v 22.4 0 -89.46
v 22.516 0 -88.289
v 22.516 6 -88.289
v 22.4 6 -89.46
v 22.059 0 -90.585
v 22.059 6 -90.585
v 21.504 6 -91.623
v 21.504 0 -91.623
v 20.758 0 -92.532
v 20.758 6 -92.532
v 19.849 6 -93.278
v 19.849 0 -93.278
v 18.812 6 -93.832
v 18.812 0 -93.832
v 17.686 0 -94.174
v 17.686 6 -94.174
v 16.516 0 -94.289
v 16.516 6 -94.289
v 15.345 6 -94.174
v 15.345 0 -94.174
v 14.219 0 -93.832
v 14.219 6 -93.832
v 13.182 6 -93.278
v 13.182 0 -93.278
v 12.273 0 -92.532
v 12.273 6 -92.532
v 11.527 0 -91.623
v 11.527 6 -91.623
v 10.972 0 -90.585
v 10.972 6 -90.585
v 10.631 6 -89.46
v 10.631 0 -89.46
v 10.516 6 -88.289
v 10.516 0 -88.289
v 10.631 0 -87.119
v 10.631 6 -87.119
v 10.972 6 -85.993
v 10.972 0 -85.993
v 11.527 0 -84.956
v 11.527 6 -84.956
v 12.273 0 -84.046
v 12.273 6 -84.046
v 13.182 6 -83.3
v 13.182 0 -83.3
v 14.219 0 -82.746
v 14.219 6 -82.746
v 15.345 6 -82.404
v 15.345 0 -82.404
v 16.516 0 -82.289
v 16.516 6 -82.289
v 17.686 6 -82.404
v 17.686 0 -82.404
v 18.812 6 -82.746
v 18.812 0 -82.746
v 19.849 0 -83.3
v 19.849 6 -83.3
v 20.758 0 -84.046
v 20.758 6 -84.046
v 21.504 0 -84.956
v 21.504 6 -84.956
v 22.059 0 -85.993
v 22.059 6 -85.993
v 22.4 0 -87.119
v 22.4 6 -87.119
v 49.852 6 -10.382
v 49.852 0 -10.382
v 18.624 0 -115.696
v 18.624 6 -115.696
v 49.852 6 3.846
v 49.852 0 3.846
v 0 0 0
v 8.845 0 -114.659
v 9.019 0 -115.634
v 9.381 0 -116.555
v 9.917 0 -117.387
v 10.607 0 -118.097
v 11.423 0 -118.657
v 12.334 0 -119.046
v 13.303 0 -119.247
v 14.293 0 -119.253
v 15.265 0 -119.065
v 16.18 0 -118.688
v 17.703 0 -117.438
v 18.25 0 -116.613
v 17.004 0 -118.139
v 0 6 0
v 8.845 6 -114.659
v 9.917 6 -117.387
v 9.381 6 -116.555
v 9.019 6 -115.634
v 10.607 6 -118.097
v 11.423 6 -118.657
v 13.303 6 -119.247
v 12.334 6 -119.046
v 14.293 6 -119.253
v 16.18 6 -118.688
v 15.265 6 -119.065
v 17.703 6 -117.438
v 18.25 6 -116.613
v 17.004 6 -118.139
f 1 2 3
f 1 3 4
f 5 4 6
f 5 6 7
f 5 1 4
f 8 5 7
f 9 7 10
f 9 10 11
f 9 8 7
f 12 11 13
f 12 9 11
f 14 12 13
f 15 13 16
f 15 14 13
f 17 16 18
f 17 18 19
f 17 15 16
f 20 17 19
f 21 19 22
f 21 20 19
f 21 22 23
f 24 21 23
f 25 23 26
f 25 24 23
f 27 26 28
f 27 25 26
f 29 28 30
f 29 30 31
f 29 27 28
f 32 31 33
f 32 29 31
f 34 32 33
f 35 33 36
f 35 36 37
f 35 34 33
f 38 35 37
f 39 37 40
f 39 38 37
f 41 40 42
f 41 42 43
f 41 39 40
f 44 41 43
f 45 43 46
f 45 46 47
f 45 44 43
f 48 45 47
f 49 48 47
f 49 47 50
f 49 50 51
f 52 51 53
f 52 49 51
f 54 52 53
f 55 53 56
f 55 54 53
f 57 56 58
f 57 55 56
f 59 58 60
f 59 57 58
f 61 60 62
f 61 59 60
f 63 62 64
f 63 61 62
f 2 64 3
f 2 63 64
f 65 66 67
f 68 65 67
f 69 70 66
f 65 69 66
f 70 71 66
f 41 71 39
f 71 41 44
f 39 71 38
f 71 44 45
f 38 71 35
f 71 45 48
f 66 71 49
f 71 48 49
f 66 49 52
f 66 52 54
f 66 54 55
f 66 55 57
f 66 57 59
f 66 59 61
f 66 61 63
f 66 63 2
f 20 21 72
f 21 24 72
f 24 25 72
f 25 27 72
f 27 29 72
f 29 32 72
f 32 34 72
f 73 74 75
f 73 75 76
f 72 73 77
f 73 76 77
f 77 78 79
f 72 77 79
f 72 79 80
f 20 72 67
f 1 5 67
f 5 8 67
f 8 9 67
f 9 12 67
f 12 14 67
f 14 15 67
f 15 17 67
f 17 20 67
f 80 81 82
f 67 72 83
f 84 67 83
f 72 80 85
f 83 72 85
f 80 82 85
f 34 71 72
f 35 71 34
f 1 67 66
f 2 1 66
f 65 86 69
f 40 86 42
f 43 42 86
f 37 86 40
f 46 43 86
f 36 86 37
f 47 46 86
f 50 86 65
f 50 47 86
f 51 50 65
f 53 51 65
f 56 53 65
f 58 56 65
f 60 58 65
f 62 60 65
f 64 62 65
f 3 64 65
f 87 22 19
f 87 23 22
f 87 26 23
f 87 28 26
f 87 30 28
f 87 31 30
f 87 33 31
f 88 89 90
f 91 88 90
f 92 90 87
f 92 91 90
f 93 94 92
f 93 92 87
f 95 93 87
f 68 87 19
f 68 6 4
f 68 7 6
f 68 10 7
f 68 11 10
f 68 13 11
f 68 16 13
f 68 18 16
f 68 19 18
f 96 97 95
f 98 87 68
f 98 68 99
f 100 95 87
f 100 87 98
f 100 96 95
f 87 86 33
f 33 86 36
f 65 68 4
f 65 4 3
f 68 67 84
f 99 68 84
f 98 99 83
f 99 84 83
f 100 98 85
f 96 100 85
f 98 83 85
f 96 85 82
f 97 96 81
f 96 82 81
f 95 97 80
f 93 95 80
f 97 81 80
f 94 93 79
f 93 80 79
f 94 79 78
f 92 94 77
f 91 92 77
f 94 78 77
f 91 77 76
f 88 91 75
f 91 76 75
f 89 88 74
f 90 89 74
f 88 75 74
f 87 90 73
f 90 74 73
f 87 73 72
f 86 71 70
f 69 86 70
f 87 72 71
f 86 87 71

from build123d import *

# Parameters (mm, degrees)
SKETCH1_R           = 6
BOSS_EXTRUDE1_DEPTH = 6


with BuildPart() as part:
    # Sketch1 → Boss-Extrude1 (new body)
    with BuildSketch(Plane(origin=(0, 0, 0), x_dir=(1, 0, 0), z_dir=(0, 1, 0))):
        with BuildLine():
            Line((8.845195956, 114.659332409), (0, 0))
            Line((0, 0), (49.851883656, -3.845737372))
            Line((49.851883656, -3.845737372), (49.851883656, 10.382317327))
            Line((49.851883656, 10.382317327), (18.624081043, 115.696191659))
            ThreePointArc((18.624081043, 115.696191659), (13.303187452, 119.246887337), (8.845195956, 114.659332409))
        make_face()
        with Locations((16.515553245, 88.289115087)):
            Circle(SKETCH1_R, mode=Mode.SUBTRACT)
    extrude(amount=BOSS_EXTRUDE1_DEPTH)


solid = part.part
